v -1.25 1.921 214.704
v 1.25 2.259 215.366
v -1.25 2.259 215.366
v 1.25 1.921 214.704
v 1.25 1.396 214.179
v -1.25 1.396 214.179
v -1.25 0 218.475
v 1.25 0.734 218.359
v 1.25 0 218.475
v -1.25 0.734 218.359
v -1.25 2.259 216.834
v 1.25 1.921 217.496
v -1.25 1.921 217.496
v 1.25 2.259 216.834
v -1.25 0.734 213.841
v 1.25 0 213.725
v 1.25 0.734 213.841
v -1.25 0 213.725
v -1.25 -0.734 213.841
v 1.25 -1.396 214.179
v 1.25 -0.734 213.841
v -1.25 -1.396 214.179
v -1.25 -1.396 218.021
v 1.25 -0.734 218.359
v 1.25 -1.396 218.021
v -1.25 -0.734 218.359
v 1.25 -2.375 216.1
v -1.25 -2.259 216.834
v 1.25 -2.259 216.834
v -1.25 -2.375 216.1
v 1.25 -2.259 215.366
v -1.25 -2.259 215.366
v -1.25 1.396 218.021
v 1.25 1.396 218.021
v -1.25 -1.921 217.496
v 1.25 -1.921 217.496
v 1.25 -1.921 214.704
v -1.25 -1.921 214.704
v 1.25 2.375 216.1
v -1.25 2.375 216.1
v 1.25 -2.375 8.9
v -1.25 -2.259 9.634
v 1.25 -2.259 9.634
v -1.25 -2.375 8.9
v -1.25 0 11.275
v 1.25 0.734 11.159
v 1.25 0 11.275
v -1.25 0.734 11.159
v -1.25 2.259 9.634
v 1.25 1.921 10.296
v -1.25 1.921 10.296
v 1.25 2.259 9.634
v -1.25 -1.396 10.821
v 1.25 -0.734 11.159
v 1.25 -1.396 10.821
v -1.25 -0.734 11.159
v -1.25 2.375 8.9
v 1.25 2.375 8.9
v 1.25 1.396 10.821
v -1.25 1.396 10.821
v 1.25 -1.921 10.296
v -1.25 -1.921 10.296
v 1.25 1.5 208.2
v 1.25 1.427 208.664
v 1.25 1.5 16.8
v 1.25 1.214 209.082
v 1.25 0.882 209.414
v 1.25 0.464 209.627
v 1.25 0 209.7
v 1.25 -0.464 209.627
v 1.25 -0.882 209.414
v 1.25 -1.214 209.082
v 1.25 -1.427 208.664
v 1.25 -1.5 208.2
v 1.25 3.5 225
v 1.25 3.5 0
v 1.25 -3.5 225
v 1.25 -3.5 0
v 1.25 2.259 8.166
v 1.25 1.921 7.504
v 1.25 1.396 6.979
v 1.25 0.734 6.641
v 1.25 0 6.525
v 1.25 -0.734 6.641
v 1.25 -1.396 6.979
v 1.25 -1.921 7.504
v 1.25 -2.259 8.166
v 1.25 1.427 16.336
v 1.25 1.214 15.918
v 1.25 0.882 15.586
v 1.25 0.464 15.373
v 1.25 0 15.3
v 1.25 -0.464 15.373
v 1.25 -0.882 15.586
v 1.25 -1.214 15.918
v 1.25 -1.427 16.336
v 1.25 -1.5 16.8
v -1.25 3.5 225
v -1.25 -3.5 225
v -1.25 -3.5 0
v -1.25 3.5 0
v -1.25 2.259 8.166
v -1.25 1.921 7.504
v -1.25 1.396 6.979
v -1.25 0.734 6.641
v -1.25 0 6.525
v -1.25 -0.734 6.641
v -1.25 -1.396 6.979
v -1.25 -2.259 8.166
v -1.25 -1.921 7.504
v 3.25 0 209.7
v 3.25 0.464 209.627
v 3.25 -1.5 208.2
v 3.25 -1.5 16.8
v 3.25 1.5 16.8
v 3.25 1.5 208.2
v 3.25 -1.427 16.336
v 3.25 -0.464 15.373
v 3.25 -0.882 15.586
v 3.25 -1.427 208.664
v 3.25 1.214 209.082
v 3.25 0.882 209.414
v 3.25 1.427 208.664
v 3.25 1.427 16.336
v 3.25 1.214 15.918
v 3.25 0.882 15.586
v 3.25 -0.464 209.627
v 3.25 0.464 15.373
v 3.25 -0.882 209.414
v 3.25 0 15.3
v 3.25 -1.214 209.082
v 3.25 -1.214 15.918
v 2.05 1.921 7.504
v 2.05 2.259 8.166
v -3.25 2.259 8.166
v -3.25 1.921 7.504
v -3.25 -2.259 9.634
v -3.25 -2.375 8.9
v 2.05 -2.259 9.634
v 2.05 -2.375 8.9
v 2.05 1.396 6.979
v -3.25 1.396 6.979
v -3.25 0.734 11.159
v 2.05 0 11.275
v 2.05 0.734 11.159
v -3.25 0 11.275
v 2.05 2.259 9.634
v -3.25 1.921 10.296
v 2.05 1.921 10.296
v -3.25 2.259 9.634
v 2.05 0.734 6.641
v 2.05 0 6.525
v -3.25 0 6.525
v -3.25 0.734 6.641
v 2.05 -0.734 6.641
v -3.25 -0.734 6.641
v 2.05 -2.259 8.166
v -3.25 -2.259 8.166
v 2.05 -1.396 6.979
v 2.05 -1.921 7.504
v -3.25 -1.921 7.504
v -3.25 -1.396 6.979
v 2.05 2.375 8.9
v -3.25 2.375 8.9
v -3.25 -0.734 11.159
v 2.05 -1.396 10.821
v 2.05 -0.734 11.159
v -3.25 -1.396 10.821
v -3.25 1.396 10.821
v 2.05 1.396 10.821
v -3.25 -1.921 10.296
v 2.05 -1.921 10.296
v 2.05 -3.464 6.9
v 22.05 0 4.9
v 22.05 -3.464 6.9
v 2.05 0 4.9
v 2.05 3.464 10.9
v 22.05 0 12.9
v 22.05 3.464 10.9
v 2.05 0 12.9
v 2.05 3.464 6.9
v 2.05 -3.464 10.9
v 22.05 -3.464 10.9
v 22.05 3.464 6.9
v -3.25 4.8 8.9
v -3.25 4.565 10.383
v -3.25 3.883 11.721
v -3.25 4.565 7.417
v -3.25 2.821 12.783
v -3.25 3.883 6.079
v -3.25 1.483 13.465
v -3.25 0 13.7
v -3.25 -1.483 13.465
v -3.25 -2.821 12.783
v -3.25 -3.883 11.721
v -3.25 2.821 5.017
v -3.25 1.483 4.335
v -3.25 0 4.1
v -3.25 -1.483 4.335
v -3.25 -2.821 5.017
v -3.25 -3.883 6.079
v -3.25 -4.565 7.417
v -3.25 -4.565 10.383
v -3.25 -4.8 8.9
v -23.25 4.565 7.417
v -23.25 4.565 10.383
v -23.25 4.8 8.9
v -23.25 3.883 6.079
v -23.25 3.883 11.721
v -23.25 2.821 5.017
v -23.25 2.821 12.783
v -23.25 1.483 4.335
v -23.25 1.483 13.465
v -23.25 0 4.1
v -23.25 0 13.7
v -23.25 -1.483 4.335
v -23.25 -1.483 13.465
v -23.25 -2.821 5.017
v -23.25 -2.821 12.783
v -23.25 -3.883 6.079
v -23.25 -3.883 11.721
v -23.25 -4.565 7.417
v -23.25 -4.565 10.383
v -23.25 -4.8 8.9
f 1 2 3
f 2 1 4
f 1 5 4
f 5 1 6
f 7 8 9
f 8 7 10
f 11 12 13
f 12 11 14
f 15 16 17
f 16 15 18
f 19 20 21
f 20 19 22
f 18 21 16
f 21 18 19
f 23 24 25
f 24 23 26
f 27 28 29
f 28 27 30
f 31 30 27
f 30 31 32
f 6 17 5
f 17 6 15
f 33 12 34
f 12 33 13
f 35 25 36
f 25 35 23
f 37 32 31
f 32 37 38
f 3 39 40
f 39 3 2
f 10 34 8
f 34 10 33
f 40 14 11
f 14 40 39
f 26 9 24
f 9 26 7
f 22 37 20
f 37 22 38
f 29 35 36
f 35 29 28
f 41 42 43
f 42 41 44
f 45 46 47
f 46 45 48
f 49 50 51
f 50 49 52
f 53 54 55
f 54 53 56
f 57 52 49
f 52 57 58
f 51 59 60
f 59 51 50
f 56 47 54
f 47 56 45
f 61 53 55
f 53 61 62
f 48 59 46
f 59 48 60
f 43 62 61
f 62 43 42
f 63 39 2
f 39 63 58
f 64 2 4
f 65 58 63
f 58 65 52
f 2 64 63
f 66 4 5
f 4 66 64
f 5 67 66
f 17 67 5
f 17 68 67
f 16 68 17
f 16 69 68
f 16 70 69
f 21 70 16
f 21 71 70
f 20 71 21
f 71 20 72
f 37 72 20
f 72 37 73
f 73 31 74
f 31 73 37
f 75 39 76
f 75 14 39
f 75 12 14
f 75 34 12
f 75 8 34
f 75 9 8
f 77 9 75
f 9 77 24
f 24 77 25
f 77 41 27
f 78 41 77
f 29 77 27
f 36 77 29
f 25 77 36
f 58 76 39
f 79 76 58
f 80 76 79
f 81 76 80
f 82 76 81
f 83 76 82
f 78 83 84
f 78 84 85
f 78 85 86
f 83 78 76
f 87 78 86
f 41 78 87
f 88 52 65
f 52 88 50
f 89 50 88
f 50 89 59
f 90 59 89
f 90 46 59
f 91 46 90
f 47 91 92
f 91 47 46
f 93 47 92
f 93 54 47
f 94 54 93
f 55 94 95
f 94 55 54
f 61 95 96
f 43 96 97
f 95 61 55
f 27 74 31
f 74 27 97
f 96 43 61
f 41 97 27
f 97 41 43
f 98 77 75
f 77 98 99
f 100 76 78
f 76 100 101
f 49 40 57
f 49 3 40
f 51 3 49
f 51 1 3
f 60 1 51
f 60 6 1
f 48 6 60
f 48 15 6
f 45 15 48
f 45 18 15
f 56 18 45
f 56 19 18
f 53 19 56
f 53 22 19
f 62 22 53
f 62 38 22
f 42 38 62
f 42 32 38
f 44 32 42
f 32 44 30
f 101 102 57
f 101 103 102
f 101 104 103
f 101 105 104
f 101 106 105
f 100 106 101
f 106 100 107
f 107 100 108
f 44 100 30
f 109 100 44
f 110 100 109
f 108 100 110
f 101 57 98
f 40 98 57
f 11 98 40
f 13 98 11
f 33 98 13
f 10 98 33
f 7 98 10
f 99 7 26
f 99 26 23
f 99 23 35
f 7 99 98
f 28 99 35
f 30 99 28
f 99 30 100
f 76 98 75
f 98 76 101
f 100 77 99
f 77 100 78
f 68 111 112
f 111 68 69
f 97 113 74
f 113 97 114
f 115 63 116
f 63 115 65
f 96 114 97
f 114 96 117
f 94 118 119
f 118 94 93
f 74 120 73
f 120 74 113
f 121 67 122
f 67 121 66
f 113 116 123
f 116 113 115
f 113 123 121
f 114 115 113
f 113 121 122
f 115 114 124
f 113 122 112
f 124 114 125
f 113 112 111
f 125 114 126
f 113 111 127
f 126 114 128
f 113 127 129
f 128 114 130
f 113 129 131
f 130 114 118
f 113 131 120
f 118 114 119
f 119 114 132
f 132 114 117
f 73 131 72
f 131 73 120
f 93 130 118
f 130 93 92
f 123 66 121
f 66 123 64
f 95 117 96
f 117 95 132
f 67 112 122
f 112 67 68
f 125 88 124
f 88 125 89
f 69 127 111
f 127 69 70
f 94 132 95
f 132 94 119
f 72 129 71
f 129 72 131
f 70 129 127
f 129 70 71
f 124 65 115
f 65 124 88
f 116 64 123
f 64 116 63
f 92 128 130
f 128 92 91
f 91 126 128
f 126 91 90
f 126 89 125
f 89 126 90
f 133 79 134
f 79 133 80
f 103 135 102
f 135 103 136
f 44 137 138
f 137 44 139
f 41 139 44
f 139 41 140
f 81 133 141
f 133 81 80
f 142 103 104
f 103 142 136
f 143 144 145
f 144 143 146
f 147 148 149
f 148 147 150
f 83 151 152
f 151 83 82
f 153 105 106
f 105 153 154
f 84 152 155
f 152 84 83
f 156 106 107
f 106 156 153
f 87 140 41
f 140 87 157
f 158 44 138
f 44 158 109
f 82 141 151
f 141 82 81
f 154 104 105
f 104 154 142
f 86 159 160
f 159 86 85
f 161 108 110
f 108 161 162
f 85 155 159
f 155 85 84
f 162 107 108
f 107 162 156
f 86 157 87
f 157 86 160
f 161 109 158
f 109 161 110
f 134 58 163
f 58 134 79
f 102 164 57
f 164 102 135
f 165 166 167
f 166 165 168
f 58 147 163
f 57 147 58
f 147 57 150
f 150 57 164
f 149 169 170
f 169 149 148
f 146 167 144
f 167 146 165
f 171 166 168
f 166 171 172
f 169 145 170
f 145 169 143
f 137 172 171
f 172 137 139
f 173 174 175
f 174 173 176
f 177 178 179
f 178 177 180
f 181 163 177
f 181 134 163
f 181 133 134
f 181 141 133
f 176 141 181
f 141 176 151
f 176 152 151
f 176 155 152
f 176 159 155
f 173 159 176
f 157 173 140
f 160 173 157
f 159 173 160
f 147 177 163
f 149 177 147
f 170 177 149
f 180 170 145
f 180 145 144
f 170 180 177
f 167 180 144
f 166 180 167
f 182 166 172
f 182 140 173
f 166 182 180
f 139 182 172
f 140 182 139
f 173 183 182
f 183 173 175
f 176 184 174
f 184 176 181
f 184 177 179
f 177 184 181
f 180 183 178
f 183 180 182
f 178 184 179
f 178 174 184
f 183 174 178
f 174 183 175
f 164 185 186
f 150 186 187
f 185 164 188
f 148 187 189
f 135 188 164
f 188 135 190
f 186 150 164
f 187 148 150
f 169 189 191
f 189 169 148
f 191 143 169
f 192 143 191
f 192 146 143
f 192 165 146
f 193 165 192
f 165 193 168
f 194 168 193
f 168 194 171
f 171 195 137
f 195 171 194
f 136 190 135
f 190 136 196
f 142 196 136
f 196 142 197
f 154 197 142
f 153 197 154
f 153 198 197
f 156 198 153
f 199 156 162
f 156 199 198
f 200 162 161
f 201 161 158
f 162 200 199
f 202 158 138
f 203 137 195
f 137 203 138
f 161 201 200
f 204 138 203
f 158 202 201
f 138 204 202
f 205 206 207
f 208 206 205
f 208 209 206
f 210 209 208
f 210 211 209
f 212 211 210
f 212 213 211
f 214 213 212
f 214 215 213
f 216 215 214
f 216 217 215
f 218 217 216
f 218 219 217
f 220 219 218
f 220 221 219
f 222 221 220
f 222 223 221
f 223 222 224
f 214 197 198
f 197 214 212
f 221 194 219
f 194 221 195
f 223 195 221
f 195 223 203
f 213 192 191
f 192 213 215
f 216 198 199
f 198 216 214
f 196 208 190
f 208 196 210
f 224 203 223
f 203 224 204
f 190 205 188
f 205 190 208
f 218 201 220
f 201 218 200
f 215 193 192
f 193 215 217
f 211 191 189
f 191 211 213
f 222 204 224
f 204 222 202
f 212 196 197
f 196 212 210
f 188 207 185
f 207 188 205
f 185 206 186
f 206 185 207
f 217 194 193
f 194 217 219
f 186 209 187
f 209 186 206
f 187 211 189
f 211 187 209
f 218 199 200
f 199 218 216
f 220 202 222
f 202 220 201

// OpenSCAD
//messurments of the metal shaft
shaft=[2.5,7,225];
//The two bolt holes
shaft_hole=4.75;
shaft_hole_ofset=8.9;
// The retaining pin 
shaft_pin=3;
shaft_pin_ofset=16.8;

bolt_head=8;
bolt_shaft=3.8; //maybe don't use this to avoid artifacts
bolt_offset=0.8; //amount of plastic between bolt head and shaft

screw_shaft_dia=6.2;
screw_head_dia=9.6;
screw_shaft_length=2;

module Shaft(){
difference() {
  cube(shaft, center = true); // This is the shaft
    union(){
    translate([0,0,(shaft[2]/2-shaft_hole_ofset)]) rotate ([0,90,0]) cylinder(h = 20, d = shaft_hole, center = true, $fn=20);
    translate([0,0,0-(shaft[2]/2-shaft_hole_ofset)]) rotate ([0,90,0]) cylinder(h = 20, d = shaft_hole, center = true, $fn=20);
    }
}
hull() { // These are the two pins.
    translate([shaft[0]/2-0.1,0,(shaft[2]/2-shaft_pin_ofset)]) rotate ([0,90,0]) cylinder(h = 2.1, d = shaft_pin, center = false, $fn=20);
    translate([shaft[0]/2-0.1,0,0-(shaft[2]/2-shaft_pin_ofset)]) rotate ([0,90,0]) cylinder(h = 2.1, d = shaft_pin, center = false, $fn=20);
}
}


module Bolt(){
// bolt hole
translate([0,0,(shaft_hole_ofset)]) rotate ([0,90,0]) cylinder(h = 20, d = shaft_hole, center = true, $fn=20);
// bolt head
translate([bolt_offset+(shaft[0]/2),0,(shaft_hole_ofset)]) rotate ([0,90,0]) cylinder(h = 20, d = bolt_head, center = false, $fn=6);
}

//Smaller shaft of red screw
translate([0-screw_shaft_length-(shaft[0]/2),0,(shaft_hole_ofset)]) rotate ([0,-90,0]) cylinder(h = 20, d = screw_shaft_dia, center = false, $fn=20);
//larger head of red screw
translate([-2-(shaft[0]/2),0,(shaft_hole_ofset)]) rotate ([0,-90,0]) cylinder(h = 20, d = screw_head_dia, center = false, $fn=20);

translate([0,0,shaft[2]/2]) Shaft();
Bolt();
